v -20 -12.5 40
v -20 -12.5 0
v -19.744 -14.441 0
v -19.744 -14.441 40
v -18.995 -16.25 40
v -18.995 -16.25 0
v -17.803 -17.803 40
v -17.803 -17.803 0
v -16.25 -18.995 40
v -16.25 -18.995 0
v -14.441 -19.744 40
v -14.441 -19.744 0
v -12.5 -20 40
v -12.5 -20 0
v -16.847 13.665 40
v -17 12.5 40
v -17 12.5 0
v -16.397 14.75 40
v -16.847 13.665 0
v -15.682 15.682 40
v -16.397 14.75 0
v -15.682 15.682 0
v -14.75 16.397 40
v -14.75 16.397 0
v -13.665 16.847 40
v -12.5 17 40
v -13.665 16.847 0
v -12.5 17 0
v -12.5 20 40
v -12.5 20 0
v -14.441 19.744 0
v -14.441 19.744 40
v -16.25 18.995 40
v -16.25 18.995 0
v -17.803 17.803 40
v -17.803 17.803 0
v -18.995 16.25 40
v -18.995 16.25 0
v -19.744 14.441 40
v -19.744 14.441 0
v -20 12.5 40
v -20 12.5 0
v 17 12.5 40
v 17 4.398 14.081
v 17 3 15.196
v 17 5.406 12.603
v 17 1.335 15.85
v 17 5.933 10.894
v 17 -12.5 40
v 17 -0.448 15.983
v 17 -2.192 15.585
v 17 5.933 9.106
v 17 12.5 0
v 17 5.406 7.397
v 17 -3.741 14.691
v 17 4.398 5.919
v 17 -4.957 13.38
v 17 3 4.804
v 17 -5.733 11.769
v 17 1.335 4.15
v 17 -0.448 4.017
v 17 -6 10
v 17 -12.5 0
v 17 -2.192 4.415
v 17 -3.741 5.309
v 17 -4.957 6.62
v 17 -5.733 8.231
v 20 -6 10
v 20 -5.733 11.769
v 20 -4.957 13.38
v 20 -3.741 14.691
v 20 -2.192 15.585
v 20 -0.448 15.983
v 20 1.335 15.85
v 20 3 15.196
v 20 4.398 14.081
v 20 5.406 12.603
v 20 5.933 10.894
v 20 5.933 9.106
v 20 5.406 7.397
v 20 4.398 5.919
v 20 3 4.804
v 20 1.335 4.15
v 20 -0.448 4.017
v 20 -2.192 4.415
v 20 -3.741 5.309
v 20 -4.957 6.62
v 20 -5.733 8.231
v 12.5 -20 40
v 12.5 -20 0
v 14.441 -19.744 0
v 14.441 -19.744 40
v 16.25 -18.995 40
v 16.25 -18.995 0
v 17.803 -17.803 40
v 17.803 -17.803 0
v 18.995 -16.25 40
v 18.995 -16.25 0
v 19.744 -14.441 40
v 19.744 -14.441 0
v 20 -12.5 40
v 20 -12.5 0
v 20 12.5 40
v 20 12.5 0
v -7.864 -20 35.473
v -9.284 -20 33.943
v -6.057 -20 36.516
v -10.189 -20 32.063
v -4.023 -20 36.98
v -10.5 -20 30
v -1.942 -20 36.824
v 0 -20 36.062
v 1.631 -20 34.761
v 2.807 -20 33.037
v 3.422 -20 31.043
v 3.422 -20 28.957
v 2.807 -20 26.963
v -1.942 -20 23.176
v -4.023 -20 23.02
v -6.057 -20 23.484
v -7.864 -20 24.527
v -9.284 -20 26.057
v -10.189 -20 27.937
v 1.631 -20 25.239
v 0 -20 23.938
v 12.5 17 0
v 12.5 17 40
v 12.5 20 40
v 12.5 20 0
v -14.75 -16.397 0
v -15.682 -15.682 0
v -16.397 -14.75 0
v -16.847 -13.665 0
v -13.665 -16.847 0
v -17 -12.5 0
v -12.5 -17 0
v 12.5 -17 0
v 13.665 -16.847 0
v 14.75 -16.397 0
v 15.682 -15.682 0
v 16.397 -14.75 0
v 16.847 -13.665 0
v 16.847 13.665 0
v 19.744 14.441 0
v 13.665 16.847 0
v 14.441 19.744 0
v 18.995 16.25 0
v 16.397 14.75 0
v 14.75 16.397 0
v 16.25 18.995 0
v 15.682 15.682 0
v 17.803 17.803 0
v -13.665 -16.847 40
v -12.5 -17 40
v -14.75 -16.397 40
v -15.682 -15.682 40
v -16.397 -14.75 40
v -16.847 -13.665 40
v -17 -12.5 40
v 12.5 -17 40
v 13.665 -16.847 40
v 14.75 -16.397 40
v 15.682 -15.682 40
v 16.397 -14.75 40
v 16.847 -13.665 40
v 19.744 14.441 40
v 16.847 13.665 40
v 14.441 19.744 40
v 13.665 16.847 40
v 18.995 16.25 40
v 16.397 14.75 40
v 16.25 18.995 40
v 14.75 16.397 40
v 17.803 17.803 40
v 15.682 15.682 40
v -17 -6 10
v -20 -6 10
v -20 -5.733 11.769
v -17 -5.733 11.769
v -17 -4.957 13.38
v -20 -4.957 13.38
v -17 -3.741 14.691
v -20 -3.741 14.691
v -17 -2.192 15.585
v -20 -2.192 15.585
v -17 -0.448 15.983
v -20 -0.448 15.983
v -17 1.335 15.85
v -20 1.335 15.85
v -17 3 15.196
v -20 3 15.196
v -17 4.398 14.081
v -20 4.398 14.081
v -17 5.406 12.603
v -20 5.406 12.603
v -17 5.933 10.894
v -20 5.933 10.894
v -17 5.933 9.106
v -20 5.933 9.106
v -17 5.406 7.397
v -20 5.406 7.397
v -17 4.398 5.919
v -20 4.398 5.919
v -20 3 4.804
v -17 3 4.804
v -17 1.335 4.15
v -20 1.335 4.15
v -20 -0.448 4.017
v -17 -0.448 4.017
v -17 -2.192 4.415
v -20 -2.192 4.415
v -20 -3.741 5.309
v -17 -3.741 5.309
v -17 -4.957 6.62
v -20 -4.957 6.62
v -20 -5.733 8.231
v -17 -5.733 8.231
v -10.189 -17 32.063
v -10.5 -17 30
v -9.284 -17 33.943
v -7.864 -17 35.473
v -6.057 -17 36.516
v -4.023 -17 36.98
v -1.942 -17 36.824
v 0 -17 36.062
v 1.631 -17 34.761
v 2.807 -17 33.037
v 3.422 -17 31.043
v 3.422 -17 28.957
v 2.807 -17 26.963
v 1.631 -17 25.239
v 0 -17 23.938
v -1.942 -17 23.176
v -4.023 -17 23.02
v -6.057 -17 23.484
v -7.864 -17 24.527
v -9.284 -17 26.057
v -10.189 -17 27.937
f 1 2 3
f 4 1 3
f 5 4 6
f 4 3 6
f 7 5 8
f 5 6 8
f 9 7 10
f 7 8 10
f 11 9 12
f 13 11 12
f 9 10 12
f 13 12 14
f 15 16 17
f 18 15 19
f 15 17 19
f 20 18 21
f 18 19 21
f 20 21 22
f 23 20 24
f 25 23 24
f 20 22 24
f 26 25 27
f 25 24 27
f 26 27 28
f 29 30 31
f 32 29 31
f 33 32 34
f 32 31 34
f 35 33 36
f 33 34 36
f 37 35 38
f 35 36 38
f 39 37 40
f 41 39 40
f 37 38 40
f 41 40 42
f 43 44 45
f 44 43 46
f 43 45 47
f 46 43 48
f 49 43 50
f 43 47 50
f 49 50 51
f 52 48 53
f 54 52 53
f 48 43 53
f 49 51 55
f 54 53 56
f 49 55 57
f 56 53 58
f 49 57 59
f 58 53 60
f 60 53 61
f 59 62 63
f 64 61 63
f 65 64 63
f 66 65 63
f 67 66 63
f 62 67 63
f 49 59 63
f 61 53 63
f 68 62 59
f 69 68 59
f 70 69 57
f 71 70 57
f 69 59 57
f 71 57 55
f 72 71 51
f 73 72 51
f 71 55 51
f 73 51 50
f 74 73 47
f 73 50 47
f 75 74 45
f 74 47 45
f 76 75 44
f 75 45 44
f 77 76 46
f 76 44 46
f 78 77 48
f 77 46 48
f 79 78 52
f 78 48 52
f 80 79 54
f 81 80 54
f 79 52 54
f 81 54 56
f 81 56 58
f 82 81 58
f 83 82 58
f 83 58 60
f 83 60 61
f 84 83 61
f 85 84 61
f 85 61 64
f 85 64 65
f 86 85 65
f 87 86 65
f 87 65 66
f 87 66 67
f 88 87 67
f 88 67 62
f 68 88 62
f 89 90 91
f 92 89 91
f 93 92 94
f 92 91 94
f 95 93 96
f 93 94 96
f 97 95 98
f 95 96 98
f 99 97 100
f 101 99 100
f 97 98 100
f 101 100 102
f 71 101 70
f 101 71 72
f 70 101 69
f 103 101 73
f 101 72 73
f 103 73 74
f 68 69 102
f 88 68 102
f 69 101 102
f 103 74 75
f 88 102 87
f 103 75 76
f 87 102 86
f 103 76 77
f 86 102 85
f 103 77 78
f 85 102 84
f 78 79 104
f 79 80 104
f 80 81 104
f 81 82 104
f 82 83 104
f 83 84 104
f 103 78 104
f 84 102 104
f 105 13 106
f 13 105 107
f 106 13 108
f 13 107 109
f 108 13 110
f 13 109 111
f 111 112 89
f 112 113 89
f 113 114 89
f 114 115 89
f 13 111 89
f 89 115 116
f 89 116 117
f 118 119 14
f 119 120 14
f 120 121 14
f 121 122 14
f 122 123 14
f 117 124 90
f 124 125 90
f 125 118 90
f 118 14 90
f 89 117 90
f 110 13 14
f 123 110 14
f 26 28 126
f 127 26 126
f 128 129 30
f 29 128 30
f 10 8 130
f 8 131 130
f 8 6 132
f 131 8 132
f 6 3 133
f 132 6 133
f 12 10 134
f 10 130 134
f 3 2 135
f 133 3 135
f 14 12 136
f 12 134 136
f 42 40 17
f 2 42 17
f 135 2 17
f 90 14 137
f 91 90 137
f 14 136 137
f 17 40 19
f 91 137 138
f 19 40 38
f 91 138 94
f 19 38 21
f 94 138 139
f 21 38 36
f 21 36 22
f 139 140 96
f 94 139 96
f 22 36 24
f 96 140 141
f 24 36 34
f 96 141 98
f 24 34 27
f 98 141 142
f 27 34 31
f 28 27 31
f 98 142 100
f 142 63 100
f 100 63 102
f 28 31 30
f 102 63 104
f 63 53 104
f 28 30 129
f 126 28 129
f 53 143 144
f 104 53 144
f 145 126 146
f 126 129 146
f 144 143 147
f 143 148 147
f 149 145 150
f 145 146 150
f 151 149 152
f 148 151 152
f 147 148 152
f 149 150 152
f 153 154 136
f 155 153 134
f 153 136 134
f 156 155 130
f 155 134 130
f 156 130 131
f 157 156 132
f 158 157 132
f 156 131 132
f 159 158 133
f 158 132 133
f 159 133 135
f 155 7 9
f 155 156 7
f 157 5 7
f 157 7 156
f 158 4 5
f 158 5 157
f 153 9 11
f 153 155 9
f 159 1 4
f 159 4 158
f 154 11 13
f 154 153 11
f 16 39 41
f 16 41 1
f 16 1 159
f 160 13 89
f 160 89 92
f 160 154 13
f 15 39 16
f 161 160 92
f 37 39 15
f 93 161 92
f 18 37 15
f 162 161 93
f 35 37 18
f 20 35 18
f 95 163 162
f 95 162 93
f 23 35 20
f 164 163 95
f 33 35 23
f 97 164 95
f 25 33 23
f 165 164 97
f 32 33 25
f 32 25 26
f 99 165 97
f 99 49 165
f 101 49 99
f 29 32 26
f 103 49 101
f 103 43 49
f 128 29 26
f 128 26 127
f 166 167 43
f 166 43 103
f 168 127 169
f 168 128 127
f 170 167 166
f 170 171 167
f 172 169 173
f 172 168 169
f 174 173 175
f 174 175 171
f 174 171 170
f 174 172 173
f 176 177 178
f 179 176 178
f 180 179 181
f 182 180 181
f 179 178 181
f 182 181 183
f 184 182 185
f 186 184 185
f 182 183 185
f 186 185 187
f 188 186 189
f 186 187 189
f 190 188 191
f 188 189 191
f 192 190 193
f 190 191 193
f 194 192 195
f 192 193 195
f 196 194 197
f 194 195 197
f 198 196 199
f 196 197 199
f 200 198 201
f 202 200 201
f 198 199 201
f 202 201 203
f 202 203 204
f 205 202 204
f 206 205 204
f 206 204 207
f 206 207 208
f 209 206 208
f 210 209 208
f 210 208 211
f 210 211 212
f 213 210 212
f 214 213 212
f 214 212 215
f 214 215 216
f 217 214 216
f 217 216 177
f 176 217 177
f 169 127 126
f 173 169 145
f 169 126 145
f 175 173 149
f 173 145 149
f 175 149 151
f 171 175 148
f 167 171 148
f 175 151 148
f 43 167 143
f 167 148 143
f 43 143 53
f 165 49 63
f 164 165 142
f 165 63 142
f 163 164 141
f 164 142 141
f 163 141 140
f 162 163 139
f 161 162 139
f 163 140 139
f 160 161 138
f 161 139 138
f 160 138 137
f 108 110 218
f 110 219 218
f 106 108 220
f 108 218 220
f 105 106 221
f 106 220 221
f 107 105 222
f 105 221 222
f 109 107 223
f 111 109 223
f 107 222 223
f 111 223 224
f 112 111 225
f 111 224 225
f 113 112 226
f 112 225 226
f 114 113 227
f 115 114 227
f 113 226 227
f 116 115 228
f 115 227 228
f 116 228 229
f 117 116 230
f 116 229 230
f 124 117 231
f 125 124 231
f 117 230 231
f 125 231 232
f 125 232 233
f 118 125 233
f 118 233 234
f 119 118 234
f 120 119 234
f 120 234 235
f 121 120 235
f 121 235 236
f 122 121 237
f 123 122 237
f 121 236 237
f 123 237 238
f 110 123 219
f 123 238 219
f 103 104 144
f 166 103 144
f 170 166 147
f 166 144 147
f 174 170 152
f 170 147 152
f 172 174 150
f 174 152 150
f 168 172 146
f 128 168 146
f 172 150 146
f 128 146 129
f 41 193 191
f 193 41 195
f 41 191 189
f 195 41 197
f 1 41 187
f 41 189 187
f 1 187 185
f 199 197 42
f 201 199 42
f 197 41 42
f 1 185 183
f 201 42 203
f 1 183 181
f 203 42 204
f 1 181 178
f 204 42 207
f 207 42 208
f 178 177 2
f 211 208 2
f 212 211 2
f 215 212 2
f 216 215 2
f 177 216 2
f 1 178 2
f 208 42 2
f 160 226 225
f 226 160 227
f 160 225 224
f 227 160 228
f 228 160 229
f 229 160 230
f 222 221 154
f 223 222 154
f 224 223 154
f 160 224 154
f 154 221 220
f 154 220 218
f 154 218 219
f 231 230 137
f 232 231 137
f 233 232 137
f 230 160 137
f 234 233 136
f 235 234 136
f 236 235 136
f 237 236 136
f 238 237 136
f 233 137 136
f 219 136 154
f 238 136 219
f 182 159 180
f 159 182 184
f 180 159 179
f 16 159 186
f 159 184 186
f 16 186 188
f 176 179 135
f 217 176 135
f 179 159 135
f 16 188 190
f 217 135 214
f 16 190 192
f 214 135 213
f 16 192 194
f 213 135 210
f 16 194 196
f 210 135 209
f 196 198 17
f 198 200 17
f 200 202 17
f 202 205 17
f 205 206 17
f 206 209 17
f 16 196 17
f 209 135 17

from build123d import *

# Parameters (mm, degrees)
F1_DEPTH = 40
F3_D     = 14
F3_DEPTH = 3
F3_TIP   = 4.2060243332
F5_D     = 12


with BuildPart() as f1:
    # F0 (on Top) → F1 (new body)
    with BuildSketch(Plane.XY):
        with BuildLine():
            Line((-12.5, -20), (12.5, -20))
            ThreePointArc((12.5, -20), (17.8033008589, -17.8033008589), (20, -12.5))
            Line((20, -12.5), (20, 12.5))
            ThreePointArc((20, 12.5), (17.8033008589, 17.8033008589), (12.5, 20))
            Line((12.5, 20), (-12.5, 20))
            ThreePointArc((-12.5, 20), (-17.8033008589, 17.8033008589), (-20, 12.5))
            Line((-20, 12.5), (-20, -12.5))
            ThreePointArc((-20, -12.5), (-17.8033008589, -17.8033008589), (-12.5, -20))
        make_face()
        with BuildLine():
            ThreePointArc((-12.5, -17), (-15.6819805153, -15.6819805153), (-17, -12.5))
            Line((-17, -12.5), (-17, 12.5))
            ThreePointArc((-17, 12.5), (-15.6819805153, 15.6819805153), (-12.5, 17))
            Line((-12.5, 17), (12.5, 17))
            ThreePointArc((12.5, 17), (15.6819805153, 15.6819805153), (17, 12.5))
            Line((17, 12.5), (17, -12.5))
            ThreePointArc((17, -12.5), (15.6819805153, -15.6819805153), (12.5, -17))
            Line((12.5, -17), (-12.5, -17))
        make_face(mode=Mode.SUBTRACT)
    extrude(amount=F1_DEPTH)

    # F3
    with Locations(Plane.XZ.offset(20)):
        with Locations((-3.5, 30)):
            Hole(F3_D / 2, depth=F3_DEPTH)
            with Locations((0, 0, -(F3_DEPTH + F3_TIP / 2))):  # 118° drill point
                Cone(0, F3_D / 2, F3_TIP, mode=Mode.SUBTRACT)

    # F5 (through all)
    with Locations(Plane.YZ.offset(20)):
        with Locations((0, 10)):
            Hole(F5_D / 2)


solid = f1.part
